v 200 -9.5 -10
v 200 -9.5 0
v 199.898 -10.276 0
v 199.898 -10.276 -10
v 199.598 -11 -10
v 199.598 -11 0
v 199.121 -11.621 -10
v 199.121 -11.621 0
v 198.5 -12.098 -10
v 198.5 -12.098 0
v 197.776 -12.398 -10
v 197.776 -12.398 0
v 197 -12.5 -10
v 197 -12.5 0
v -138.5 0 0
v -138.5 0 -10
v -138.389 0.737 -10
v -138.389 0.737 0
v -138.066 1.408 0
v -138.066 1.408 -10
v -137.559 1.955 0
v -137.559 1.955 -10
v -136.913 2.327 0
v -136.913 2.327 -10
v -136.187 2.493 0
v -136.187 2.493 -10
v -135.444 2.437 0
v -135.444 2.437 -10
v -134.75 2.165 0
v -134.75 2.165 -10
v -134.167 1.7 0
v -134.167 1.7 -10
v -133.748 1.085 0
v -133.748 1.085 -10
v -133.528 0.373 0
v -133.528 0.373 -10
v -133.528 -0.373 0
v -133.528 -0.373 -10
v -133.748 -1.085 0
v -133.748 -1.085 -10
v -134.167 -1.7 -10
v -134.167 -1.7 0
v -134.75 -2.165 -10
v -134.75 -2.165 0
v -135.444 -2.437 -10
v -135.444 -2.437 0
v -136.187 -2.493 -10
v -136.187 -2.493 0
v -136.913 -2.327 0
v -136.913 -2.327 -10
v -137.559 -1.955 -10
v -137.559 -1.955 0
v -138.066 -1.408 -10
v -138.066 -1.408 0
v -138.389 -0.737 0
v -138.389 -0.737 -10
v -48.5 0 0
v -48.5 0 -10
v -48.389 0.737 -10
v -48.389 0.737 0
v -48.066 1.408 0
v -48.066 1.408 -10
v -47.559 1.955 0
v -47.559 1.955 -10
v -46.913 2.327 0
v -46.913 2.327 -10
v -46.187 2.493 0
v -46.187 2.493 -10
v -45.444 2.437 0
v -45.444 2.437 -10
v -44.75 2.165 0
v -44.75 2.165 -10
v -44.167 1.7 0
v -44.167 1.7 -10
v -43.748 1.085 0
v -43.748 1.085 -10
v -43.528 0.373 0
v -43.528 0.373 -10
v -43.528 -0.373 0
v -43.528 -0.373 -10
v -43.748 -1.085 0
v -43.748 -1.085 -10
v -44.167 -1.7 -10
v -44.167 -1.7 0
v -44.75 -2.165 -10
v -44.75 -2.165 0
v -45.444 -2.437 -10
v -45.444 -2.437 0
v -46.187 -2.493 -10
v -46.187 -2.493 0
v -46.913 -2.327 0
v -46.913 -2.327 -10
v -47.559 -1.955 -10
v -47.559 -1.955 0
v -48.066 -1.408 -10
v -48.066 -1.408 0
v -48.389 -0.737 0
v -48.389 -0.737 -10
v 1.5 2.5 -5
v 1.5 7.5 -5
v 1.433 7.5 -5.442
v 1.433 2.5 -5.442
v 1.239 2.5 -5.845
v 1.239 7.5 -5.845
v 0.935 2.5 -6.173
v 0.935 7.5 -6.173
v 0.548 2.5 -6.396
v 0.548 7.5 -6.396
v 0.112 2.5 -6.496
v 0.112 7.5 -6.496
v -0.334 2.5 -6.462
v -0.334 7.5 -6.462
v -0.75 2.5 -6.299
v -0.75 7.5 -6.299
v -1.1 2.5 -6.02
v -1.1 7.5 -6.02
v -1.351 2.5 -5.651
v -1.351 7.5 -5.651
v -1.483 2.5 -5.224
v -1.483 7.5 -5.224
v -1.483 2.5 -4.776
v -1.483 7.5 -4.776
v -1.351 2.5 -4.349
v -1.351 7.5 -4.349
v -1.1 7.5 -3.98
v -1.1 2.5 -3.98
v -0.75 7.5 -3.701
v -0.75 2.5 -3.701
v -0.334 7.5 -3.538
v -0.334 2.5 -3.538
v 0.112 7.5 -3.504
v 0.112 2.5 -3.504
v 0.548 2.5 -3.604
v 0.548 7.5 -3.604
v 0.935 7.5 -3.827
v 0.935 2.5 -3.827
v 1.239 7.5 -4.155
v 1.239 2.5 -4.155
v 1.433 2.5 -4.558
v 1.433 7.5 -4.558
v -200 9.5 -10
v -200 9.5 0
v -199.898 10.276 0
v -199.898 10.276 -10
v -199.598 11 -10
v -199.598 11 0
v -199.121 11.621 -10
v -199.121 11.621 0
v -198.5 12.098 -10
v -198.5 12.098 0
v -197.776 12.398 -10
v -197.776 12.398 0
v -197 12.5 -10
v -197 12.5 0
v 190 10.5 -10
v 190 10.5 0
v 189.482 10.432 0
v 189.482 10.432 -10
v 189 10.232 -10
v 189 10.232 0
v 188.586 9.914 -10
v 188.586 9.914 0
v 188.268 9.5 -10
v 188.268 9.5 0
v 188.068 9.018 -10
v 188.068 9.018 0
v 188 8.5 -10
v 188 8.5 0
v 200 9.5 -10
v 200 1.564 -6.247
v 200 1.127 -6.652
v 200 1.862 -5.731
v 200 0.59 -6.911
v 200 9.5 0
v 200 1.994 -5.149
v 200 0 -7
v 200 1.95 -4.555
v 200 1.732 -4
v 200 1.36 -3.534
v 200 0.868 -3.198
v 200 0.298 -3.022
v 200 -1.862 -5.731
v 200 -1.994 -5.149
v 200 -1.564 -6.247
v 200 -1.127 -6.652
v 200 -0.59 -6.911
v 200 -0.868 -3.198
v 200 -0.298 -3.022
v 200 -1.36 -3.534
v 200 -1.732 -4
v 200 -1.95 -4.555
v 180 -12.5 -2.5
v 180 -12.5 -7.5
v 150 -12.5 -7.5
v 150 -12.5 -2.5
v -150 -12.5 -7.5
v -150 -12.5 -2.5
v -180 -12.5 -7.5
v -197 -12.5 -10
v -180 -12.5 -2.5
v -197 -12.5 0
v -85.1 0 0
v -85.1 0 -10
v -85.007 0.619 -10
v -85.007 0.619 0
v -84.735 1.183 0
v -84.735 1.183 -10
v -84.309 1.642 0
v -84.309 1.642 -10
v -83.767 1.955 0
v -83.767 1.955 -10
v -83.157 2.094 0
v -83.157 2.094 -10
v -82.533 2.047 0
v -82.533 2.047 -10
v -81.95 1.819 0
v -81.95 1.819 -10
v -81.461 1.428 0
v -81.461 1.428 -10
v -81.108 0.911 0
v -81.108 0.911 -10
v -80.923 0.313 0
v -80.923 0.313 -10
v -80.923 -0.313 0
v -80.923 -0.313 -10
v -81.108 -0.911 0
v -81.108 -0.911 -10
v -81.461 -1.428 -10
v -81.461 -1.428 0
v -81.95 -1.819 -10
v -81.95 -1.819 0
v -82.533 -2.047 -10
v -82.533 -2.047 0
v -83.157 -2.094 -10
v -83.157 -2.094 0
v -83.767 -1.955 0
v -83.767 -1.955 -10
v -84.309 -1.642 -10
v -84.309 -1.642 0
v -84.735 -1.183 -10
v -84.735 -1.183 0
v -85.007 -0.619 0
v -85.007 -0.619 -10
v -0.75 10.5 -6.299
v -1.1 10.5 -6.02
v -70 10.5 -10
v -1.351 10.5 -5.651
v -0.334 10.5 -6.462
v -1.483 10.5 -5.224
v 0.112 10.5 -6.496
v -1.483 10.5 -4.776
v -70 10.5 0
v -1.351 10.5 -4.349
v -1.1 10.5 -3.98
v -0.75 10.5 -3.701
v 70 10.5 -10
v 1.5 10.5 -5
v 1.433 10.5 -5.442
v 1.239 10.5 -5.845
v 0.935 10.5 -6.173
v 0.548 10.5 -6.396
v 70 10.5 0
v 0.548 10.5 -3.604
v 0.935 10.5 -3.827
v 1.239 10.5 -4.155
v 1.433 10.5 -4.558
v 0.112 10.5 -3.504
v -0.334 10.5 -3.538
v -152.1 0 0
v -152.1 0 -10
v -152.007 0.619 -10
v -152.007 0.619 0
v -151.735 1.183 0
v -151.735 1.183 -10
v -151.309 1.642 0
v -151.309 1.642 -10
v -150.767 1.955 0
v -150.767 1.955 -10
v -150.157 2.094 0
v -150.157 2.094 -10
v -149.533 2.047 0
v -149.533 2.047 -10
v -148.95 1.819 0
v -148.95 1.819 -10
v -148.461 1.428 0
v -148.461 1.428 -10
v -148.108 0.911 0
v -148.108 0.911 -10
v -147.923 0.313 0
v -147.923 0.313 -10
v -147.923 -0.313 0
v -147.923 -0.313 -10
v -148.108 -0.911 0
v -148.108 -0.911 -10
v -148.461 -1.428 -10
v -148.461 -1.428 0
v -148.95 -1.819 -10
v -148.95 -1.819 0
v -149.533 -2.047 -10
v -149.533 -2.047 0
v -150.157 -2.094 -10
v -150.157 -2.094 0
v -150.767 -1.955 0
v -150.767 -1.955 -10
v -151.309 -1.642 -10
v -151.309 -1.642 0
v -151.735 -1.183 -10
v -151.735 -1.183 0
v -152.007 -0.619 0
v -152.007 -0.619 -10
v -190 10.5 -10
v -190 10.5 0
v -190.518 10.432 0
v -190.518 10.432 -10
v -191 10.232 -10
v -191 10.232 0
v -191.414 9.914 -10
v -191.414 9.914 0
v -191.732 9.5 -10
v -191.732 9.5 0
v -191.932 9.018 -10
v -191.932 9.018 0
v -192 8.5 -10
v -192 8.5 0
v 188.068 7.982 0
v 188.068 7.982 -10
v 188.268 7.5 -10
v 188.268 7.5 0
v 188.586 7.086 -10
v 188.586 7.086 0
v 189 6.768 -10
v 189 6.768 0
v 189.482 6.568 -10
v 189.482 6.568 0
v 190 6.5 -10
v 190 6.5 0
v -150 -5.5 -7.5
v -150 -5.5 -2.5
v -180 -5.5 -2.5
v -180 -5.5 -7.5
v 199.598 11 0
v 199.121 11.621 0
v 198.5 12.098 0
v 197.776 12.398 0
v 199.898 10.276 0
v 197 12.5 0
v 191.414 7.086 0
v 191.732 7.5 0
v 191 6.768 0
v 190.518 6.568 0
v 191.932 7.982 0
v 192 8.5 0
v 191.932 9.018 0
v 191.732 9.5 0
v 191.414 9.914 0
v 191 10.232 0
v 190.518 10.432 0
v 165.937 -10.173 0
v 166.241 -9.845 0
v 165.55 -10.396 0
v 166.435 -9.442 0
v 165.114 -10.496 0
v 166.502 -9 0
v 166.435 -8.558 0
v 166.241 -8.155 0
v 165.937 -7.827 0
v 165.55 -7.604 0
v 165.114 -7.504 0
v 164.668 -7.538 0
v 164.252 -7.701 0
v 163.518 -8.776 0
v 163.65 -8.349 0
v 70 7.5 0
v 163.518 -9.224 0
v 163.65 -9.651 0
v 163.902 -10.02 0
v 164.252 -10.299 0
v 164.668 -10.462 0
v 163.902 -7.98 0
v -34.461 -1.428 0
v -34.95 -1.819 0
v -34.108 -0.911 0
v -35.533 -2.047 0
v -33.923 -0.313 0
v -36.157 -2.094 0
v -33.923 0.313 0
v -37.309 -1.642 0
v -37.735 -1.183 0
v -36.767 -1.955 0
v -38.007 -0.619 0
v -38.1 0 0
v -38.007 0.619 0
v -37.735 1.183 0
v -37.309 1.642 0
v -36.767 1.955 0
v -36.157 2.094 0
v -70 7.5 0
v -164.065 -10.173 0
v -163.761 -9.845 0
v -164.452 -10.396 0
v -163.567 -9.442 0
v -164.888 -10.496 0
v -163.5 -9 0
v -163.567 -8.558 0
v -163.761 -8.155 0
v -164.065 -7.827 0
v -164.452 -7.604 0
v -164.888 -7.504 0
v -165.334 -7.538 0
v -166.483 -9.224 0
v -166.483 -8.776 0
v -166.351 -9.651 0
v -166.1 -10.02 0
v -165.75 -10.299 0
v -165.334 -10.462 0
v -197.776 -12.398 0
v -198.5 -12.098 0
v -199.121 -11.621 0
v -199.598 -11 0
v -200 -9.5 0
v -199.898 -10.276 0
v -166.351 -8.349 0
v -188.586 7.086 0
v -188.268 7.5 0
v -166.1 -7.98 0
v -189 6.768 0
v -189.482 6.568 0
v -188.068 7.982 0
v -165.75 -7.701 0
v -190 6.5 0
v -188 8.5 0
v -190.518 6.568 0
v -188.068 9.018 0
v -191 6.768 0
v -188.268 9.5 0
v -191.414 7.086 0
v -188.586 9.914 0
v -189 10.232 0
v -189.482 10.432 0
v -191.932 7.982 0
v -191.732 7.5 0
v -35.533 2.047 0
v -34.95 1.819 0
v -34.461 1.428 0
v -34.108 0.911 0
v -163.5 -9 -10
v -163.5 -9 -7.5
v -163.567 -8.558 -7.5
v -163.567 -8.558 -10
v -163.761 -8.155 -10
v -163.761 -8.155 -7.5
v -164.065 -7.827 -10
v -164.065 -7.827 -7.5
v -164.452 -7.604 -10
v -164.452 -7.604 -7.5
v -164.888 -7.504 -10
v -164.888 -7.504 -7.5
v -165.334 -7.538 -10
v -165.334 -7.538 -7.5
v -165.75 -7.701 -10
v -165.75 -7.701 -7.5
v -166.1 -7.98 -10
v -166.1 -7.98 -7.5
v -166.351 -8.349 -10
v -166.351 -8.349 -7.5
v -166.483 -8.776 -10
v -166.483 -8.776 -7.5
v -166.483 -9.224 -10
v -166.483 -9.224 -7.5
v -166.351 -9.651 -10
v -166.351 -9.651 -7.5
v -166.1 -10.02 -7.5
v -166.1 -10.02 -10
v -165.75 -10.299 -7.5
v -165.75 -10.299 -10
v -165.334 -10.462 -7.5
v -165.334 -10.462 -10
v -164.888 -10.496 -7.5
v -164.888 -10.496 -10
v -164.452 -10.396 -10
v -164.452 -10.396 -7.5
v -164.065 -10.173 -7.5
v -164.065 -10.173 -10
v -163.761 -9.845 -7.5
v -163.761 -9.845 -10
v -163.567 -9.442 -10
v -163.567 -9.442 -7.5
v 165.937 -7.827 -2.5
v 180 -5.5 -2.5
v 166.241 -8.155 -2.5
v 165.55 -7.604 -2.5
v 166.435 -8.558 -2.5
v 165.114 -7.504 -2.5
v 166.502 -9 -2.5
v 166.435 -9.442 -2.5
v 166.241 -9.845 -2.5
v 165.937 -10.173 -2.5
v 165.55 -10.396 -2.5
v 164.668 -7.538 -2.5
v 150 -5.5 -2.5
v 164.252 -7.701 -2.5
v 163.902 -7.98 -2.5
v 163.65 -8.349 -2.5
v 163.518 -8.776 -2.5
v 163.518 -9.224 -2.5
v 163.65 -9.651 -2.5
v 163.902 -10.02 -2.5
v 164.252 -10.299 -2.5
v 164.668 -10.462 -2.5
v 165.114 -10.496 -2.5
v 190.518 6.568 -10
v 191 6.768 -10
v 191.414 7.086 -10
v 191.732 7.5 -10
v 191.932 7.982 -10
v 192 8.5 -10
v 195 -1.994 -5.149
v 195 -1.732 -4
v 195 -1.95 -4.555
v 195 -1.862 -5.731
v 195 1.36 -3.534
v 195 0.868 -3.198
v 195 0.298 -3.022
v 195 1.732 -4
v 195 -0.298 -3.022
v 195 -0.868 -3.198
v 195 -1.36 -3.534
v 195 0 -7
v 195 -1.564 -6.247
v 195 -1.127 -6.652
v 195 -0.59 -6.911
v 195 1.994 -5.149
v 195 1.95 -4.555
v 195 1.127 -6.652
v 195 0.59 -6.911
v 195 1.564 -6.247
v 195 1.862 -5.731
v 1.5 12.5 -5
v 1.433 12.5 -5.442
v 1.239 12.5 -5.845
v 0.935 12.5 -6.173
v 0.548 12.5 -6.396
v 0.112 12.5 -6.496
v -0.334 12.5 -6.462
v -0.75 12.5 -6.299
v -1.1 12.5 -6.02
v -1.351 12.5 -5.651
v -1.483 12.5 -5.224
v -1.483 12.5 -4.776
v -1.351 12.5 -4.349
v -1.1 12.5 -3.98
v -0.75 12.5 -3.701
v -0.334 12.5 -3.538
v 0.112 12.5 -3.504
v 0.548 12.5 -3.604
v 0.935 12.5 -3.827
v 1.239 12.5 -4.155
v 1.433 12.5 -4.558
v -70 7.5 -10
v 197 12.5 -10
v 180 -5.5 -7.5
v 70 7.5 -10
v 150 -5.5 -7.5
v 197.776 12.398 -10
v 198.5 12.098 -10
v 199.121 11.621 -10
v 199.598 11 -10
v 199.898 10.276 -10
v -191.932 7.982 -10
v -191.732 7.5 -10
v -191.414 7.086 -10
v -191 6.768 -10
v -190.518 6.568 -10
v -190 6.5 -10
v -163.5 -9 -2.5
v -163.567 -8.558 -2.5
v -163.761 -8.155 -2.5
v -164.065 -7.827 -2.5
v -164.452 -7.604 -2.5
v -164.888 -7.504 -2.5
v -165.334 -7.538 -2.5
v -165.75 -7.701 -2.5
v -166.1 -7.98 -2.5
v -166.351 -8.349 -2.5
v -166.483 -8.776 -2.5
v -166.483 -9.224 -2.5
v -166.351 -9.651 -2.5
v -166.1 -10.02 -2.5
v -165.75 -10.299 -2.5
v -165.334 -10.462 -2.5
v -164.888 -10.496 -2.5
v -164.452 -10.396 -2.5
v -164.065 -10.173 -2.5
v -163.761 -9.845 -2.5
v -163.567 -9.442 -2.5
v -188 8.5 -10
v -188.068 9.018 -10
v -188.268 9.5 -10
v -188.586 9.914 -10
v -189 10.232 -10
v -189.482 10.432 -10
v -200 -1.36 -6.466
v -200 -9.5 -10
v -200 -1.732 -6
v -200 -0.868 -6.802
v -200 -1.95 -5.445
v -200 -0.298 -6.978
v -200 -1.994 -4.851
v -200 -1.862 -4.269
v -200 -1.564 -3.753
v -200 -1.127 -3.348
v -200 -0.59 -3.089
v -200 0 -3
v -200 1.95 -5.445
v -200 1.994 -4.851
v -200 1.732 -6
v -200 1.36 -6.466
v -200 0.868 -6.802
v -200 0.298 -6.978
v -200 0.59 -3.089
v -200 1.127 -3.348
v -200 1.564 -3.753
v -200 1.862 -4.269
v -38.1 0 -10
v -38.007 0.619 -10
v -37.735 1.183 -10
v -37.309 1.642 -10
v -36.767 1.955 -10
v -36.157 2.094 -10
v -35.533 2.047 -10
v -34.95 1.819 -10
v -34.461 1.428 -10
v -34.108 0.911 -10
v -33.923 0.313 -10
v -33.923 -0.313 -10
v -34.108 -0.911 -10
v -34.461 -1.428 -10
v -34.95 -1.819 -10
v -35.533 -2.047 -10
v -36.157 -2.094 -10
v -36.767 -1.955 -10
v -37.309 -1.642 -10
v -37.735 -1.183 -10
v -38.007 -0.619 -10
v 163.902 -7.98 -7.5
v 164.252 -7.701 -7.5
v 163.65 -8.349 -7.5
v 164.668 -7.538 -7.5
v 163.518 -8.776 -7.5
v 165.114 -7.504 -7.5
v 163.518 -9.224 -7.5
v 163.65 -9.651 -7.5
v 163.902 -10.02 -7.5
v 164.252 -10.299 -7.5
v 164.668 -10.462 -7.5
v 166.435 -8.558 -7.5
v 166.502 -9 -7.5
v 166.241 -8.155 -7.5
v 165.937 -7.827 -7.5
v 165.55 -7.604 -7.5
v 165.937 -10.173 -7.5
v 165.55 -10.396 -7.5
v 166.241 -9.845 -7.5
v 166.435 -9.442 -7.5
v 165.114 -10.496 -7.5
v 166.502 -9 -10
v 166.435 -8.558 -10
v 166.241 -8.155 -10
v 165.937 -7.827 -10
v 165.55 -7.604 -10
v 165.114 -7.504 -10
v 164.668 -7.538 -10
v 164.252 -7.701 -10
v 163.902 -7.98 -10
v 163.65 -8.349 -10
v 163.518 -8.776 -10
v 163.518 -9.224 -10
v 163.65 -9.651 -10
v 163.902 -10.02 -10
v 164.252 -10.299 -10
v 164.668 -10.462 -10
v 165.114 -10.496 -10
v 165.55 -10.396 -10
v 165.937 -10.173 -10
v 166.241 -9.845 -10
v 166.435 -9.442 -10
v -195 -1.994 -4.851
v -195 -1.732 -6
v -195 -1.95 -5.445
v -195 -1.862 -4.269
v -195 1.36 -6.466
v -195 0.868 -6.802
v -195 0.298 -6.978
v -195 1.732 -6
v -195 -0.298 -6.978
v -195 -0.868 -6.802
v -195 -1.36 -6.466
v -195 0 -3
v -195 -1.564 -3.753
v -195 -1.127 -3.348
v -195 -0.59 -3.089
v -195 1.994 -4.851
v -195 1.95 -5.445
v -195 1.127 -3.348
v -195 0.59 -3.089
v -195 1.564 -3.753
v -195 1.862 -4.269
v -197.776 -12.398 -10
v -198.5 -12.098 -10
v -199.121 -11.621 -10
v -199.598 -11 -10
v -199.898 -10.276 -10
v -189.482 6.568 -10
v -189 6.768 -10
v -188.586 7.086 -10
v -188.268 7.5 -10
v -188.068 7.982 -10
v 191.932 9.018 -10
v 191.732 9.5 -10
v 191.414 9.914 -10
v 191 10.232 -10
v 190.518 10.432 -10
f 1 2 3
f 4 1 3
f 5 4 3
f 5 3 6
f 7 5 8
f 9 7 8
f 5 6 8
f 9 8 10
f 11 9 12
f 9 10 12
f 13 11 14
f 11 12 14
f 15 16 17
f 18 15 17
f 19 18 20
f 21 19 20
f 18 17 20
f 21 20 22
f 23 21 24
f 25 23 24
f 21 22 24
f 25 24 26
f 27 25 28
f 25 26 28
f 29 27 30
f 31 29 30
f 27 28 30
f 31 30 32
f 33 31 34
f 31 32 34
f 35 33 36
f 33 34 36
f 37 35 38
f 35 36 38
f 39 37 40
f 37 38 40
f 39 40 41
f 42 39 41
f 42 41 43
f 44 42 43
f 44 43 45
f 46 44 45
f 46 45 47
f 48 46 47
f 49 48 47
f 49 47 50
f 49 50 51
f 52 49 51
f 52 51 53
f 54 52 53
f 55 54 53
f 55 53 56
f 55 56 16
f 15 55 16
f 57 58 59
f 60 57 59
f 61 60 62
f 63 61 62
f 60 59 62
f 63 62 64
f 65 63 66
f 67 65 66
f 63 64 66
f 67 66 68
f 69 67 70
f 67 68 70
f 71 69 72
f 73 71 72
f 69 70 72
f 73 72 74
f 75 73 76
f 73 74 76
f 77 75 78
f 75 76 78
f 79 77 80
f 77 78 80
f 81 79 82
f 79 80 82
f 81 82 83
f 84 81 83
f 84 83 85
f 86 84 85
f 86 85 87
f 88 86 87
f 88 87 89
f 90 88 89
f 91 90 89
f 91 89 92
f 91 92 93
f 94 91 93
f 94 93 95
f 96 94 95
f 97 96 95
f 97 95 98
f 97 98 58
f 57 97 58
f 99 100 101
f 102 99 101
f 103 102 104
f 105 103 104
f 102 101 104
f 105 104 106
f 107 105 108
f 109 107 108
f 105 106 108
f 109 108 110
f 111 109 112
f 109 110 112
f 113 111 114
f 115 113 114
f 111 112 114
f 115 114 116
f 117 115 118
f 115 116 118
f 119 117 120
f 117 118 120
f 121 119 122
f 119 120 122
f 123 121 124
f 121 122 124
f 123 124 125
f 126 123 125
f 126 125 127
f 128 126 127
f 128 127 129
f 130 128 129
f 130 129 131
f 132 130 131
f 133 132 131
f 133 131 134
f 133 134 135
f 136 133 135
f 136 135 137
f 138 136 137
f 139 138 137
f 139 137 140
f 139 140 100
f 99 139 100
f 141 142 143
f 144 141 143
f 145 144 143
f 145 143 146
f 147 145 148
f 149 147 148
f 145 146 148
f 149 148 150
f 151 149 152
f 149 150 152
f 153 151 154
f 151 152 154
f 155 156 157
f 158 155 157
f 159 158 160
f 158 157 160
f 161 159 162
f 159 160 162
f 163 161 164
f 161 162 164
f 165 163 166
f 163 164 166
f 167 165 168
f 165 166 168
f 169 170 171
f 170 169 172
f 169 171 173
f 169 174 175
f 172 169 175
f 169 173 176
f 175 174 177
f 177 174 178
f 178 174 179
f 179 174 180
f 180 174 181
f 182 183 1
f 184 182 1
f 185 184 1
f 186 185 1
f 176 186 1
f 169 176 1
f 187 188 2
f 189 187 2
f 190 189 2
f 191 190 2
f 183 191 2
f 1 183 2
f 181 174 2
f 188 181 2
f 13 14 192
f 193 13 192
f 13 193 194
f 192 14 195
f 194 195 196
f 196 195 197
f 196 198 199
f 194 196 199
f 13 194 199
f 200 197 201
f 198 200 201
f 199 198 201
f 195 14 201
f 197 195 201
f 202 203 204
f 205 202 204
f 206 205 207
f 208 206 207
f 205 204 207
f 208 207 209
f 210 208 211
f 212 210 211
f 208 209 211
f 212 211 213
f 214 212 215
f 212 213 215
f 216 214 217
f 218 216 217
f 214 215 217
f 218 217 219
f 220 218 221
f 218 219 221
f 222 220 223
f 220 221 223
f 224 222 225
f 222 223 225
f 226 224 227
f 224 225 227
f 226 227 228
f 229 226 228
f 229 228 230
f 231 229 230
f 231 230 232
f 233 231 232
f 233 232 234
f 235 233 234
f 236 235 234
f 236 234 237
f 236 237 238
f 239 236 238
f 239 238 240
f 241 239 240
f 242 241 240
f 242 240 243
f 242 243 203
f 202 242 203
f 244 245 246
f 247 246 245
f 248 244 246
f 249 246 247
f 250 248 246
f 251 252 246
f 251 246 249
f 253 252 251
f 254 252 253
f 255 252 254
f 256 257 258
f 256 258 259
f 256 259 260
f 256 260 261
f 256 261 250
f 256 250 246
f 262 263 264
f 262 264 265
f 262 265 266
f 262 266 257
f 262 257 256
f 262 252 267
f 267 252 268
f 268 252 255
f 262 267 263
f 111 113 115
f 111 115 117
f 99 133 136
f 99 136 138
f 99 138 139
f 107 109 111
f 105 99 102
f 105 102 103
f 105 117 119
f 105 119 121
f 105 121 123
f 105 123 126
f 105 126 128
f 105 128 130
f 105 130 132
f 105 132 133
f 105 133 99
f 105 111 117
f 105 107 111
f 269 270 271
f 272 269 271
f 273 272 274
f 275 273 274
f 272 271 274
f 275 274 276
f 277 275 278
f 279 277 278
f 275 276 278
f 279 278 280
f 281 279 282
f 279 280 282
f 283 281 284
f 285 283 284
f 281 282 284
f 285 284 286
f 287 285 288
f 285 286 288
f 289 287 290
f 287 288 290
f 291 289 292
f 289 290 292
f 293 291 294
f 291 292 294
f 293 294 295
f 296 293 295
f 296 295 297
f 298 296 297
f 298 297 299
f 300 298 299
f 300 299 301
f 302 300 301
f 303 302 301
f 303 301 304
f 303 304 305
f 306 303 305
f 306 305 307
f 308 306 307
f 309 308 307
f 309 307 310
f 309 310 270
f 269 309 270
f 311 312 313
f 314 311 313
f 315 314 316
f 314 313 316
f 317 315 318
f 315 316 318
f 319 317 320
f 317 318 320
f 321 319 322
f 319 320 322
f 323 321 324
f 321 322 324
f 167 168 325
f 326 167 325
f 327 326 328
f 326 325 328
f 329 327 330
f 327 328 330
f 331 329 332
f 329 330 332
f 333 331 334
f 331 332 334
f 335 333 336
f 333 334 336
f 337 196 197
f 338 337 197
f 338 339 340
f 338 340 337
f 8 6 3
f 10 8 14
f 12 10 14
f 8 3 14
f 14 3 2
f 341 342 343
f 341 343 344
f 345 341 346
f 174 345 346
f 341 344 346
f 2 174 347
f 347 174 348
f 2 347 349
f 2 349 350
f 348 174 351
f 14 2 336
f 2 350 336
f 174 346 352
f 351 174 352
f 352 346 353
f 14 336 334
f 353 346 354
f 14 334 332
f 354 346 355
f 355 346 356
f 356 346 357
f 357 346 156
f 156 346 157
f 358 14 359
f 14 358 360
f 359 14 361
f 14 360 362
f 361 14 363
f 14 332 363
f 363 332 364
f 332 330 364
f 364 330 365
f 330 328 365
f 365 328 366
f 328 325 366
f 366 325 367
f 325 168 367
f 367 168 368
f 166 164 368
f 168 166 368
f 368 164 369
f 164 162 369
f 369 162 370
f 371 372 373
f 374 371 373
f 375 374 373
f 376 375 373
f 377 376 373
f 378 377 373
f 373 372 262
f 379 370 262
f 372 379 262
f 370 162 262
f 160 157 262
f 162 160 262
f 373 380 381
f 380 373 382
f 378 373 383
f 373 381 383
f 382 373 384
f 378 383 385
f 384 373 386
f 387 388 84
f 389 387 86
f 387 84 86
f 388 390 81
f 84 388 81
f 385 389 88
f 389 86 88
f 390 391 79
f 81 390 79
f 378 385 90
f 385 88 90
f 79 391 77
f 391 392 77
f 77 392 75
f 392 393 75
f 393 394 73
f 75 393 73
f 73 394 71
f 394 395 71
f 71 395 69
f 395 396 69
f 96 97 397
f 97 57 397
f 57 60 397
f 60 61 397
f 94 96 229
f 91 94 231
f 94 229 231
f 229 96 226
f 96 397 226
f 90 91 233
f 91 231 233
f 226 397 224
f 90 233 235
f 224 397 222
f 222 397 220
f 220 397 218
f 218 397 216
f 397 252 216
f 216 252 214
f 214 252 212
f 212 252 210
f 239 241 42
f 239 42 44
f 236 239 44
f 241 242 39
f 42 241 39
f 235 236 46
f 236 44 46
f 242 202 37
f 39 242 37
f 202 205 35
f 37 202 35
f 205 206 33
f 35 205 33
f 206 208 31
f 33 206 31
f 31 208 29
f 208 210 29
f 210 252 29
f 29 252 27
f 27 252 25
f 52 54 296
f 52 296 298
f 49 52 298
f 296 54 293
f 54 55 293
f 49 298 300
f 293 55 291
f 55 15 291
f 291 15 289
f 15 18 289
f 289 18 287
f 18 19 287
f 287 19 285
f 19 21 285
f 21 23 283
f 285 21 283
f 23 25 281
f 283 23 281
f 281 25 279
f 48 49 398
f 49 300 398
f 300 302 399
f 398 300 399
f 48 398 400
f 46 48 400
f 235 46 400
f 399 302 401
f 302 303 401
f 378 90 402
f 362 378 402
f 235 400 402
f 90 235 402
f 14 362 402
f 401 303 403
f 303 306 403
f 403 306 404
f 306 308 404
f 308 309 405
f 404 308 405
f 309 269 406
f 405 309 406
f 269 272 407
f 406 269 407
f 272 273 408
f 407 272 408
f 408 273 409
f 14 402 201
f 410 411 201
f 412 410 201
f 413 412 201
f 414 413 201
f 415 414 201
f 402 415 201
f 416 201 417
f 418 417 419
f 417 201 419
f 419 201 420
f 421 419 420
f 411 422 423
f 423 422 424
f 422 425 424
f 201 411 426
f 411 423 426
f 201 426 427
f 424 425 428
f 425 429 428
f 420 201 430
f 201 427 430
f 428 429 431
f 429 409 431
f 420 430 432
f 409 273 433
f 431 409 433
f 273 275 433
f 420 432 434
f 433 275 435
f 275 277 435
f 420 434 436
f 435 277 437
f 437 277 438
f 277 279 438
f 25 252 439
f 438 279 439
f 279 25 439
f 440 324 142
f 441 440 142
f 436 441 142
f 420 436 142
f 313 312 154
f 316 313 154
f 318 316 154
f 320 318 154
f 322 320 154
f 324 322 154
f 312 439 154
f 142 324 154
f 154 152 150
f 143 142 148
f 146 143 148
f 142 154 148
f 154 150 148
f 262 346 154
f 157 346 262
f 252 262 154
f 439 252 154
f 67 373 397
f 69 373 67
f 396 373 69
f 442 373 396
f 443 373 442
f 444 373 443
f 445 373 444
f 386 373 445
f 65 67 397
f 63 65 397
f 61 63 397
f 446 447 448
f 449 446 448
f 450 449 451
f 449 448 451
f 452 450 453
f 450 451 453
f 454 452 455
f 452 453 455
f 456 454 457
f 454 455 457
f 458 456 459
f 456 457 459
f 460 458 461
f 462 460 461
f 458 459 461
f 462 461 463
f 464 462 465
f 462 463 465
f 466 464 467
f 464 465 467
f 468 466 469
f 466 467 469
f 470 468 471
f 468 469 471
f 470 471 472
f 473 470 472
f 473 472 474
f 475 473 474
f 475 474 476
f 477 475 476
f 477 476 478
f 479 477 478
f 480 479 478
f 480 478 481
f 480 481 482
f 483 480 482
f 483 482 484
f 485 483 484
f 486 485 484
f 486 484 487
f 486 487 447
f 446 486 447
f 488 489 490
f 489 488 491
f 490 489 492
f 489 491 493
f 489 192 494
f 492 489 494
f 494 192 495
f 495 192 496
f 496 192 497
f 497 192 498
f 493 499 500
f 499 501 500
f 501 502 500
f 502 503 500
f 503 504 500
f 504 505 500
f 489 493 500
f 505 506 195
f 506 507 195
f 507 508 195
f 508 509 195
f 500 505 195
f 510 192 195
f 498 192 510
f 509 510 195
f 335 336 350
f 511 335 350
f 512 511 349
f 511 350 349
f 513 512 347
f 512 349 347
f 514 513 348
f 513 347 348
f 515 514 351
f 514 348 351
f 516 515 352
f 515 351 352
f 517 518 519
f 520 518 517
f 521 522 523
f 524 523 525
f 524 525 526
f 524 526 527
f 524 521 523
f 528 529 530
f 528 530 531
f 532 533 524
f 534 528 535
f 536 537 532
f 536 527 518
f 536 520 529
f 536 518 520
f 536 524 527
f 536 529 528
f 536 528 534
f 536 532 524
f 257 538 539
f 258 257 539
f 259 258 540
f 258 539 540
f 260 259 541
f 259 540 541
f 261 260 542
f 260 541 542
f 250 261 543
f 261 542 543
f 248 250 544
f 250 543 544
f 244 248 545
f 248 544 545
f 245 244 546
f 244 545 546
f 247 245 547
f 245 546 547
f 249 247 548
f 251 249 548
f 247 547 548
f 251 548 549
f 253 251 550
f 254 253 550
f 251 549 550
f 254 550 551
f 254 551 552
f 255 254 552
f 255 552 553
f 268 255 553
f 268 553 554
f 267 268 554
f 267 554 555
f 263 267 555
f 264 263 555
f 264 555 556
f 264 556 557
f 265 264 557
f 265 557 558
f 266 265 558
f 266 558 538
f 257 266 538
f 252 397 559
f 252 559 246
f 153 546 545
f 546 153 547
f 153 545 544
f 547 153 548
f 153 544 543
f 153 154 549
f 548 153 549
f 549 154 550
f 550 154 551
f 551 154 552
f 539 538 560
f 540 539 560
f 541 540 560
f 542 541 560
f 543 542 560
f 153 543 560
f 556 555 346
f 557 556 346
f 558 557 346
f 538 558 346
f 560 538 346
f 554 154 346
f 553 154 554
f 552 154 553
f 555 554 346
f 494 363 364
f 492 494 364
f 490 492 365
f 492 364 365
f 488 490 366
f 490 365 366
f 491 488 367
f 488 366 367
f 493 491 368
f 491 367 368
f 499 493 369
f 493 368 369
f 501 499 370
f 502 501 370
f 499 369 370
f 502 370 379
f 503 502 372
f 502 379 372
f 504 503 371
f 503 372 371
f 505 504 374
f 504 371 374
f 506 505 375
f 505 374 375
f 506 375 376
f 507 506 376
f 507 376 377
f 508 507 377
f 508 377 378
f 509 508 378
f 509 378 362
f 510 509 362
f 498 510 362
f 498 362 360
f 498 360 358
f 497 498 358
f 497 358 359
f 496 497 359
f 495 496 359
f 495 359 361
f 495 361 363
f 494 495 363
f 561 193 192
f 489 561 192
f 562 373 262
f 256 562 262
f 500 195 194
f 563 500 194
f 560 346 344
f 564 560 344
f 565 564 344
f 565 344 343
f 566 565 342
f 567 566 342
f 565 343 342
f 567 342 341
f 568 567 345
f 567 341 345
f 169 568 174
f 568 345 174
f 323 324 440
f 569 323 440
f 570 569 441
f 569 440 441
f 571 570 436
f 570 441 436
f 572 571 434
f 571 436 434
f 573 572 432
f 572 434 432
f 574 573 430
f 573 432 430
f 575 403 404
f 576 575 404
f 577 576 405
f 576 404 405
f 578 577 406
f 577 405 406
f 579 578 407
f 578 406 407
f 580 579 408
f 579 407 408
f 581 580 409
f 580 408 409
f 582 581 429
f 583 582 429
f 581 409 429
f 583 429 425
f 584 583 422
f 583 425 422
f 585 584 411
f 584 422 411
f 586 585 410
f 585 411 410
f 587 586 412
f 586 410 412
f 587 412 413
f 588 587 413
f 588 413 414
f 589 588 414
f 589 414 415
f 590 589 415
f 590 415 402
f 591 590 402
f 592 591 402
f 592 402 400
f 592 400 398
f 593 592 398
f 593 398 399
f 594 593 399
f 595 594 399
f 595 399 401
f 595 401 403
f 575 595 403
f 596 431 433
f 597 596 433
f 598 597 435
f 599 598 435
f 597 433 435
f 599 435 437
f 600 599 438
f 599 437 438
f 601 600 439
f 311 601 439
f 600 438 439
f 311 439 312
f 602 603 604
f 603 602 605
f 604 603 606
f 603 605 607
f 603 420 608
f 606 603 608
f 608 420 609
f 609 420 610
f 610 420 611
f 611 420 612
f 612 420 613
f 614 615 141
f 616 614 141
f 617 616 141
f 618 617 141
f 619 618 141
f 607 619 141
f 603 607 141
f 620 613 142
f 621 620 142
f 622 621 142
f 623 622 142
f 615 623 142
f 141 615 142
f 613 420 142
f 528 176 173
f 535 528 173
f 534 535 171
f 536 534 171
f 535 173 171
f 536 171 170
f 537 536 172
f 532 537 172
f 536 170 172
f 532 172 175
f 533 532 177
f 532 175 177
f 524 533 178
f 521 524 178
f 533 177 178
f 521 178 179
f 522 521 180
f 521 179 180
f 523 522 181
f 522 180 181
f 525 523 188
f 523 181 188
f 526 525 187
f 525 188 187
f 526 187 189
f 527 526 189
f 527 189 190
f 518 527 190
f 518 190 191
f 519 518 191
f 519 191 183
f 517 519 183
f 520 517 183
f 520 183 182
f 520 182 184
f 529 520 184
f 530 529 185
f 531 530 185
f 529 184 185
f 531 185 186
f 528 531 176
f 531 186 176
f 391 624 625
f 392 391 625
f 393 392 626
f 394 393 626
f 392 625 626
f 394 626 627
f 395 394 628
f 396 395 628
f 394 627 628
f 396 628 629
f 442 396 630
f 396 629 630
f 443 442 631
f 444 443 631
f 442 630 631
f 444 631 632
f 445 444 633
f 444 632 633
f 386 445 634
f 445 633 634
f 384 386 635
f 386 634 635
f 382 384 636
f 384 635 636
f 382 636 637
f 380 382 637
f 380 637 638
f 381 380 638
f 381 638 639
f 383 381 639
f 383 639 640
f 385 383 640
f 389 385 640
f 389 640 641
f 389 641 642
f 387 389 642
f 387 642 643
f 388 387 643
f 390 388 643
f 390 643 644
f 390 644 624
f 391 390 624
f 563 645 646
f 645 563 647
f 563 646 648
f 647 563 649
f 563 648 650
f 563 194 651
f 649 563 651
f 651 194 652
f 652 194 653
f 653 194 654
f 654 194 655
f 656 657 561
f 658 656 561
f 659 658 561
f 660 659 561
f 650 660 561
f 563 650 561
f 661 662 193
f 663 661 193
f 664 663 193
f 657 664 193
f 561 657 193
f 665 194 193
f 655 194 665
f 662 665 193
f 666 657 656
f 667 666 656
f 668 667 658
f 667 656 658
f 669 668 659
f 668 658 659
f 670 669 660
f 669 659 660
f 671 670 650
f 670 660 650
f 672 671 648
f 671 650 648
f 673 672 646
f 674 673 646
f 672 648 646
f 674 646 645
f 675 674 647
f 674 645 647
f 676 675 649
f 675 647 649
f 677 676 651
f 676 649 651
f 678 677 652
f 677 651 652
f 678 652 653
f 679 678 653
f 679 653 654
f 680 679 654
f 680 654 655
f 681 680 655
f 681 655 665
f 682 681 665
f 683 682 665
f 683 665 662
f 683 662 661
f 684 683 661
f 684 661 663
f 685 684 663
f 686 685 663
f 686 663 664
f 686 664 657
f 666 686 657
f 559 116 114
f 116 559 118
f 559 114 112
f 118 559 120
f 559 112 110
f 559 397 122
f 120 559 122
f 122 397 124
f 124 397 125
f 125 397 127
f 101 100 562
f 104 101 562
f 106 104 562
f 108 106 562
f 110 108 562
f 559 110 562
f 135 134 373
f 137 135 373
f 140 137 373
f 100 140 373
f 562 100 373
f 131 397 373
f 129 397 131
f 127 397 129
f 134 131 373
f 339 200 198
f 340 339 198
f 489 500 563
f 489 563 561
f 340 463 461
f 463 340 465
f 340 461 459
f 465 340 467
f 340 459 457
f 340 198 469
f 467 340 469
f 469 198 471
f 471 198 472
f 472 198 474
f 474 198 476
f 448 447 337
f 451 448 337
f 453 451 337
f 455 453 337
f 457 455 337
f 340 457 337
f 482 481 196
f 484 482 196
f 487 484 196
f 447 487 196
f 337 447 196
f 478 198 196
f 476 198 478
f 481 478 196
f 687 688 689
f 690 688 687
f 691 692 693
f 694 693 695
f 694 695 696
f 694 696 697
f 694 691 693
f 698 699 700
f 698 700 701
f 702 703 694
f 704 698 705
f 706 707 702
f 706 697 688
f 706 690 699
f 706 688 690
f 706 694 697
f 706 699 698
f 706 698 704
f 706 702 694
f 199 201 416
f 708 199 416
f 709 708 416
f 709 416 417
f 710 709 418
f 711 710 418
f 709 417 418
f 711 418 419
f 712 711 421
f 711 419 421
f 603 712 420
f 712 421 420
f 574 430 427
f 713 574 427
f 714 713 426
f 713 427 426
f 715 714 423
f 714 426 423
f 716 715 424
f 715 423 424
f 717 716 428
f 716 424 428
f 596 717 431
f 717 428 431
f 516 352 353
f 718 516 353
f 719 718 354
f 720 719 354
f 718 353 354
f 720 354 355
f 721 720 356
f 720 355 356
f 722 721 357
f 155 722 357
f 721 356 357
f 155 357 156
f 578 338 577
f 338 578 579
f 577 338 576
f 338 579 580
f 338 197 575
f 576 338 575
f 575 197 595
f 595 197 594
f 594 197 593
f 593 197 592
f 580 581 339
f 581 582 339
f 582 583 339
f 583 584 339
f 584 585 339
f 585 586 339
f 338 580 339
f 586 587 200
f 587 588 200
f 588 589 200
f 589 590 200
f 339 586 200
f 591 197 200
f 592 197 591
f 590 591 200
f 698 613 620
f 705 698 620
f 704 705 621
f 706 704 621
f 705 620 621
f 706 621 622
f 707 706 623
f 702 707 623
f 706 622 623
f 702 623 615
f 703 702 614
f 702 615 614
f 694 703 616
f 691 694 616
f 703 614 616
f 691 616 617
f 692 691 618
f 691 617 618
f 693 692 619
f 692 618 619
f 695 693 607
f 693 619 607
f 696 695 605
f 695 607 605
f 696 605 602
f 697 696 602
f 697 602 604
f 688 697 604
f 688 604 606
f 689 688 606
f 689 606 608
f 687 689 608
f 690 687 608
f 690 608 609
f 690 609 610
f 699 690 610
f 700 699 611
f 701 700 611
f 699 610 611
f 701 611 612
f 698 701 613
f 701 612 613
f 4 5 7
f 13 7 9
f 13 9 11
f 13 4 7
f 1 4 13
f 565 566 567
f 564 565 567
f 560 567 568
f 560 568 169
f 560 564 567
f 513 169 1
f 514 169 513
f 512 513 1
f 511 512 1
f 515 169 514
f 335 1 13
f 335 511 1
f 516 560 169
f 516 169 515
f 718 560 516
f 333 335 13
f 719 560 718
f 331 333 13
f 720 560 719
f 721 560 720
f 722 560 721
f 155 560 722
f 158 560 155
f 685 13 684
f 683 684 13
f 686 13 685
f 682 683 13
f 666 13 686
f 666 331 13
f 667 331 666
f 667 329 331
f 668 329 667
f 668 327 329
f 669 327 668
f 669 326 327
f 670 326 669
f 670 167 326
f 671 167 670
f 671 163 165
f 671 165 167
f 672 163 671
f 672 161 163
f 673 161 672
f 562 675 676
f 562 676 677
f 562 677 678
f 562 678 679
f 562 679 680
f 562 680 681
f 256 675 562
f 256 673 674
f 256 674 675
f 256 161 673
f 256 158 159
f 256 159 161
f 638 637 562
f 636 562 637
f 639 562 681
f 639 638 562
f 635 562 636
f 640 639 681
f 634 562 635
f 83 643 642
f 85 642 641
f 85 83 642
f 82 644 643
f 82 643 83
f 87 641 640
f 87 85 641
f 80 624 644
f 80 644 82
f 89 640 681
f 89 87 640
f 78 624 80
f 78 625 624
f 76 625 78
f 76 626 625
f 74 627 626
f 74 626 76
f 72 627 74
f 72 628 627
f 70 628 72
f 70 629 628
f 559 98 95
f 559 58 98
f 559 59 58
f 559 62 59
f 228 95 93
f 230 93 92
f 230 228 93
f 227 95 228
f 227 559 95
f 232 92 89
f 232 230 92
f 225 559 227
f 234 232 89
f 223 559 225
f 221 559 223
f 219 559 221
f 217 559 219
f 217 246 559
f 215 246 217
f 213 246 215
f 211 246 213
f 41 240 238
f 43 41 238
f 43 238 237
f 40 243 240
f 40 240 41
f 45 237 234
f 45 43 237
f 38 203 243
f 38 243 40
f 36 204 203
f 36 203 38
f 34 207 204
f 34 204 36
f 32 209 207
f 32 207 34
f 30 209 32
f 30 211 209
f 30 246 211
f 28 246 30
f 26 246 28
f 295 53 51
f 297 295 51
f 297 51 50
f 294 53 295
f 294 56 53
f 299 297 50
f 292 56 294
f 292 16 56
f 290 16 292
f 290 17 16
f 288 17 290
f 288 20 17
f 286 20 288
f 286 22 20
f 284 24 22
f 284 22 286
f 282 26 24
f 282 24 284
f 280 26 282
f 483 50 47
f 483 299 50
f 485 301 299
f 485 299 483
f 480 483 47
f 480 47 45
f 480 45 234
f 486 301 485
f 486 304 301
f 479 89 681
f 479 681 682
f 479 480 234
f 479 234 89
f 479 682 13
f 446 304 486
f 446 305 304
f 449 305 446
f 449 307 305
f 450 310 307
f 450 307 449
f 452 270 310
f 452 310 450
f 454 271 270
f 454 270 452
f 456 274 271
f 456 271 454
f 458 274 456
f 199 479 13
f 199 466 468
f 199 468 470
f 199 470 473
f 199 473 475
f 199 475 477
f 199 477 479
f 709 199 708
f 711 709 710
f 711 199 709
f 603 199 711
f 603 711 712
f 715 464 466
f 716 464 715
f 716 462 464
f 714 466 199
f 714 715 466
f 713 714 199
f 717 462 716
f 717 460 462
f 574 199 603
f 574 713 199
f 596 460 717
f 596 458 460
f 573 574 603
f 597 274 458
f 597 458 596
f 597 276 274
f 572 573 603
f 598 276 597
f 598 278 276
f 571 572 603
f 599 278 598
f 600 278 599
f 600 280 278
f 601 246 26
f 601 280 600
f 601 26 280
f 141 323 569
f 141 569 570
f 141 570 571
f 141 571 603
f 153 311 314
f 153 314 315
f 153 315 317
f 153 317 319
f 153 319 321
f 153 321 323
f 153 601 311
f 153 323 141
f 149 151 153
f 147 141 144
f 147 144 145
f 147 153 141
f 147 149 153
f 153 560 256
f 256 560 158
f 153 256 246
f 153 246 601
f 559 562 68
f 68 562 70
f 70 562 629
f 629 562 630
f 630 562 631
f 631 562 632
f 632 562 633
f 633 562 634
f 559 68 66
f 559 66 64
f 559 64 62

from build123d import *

# Parameters (mm, degrees)
EXTRUDE_1_DEPTH        = 10
SKETCH_3_W             = 140
SKETCH_3_H             = 3
CUT_EXTRUDE_1_DEPTH    = 10
CUT_EXTRUDE_2_DEPTH    = 10
HOLE_WIZARD_M5_3_D     = 4.2
HOLE_WIZARD_M5_3_DEPTH = 14
HOLE_WIZARD_M5_3_TIP   = 1.2618073
HOLE_WIZARD_M6_2_D     = 5
HOLE_WIZARD_M6_2_DEPTH = 17
HOLE_WIZARD_M6_2_TIP   = 1.502151548
SKETCH_10_W            = 15
SKETCH_10_H            = 2.5
CUT_EXTRUDE_3_DEPTH    = 7
SKETCH_11_R            = 1.5
CUT_EXTRUDE_4_DEPTH    = 11
SKETCH_13_R            = 2
CUT_EXTRUDE_6_DEPTH    = 5
SKETCH_14_R            = 2
CUT_EXTRUDE_7_DEPTH    = 5
SKETCH_16_R            = 1.5
CUT_EXTRUDE_8_DEPTH    = 10


with BuildPart() as part:
    # 草图1 → 凸台-拉伸1 (new body)
    with BuildSketch(Plane.XY):
        with BuildLine():
            Line((-197, 12.5), (197, 12.5))
            ThreePointArc((197, 12.5), (199.121320344, 11.621320344), (200, 9.5))
            Line((200, 9.5), (200, -9.5))
            ThreePointArc((200, -9.5), (199.121320344, -11.621320344), (197, -12.5))
            Line((197, -12.5), (-197, -12.5))
            ThreePointArc((-197, -12.5), (-199.121320344, -11.621320344), (-200, -9.5))
            Line((-200, -9.5), (-200, 9.5))
            ThreePointArc((-200, 9.5), (-199.121320344, 11.621320344), (-197, 12.5))
        make_face()
    extrude(amount=-EXTRUDE_1_DEPTH)

    # 草图3 → 切除-拉伸1 (cut)
    with BuildSketch(Plane.XY):
        with Locations((0, 9)):
            Rectangle(SKETCH_3_W, SKETCH_3_H)
    extrude(amount=-CUT_EXTRUDE_1_DEPTH, mode=Mode.SUBTRACT)

    # 草图4 → 切除-拉伸2 (cut)
    with BuildSketch(Plane.XY):
        with BuildLine():
            ThreePointArc((-190, 10.5), (-191.414213562, 9.914213562), (-192, 8.5))
            Line((-192, 8.5), (-190, 8.5))
            Line((-190, 8.5), (-190, 10.5))
        make_face()
        with BuildLine():
            Line((-190, 8.5), (-192, 8.5))
            ThreePointArc((-192, 8.5), (-191.414213562, 7.085786438), (-190, 6.5))
            Line((-190, 6.5), (-190, 8.5))
        make_face()
        with BuildLine():
            Line((-190, 10.5), (-190, 8.5))
            Line((-190, 8.5), (-188, 8.5))
            ThreePointArc((-188, 8.5), (-188.585786438, 9.914213562), (-190, 10.5))
        make_face()
        with BuildLine():
            Line((-188, 8.5), (-190, 8.5))
            Line((-190, 8.5), (-190, 6.5))
            ThreePointArc((-190, 6.5), (-188.585786438, 7.085786438), (-188, 8.5))
        make_face()
        with BuildLine():
            ThreePointArc((190, 10.5), (188.585786438, 9.914213562), (188, 8.5))
            Line((188, 8.5), (190, 8.5))
            Line((190, 8.5), (190, 10.5))
        make_face()
        with BuildLine():
            Line((190, 8.5), (188, 8.5))
            ThreePointArc((188, 8.5), (188.585786438, 7.085786438), (190, 6.5))
            Line((190, 6.5), (190, 8.5))
        make_face()
        with BuildLine():
            Line((190, 10.5), (190, 8.5))
            Line((190, 8.5), (192, 8.5))
            ThreePointArc((192, 8.5), (191.414213562, 9.914213562), (190, 10.5))
        make_face()
        with BuildLine():
            Line((192, 8.5), (190, 8.5))
            Line((190, 8.5), (190, 6.5))
            ThreePointArc((190, 6.5), (191.414213562, 7.085786438), (192, 8.5))
        make_face()
    extrude(amount=-CUT_EXTRUDE_2_DEPTH, mode=Mode.SUBTRACT)

    # M5 螺纹孔3
    with Locations(Plane.XY):
        with Locations((-150, 0), (-83, 0), (-36, 0)):
            Hole(HOLE_WIZARD_M5_3_D / 2, depth=HOLE_WIZARD_M5_3_DEPTH)
            with Locations((0, 0, -(HOLE_WIZARD_M5_3_DEPTH + HOLE_WIZARD_M5_3_TIP / 2))):  # 118° drill point
                Cone(0, HOLE_WIZARD_M5_3_D / 2, HOLE_WIZARD_M5_3_TIP, mode=Mode.SUBTRACT)

    # M6 螺纹孔2
    with Locations(Plane.XY):
        with Locations((-46, 0), (-136, 0)):
            Hole(HOLE_WIZARD_M6_2_D / 2, depth=HOLE_WIZARD_M6_2_DEPTH)
            with Locations((0, 0, -(HOLE_WIZARD_M6_2_DEPTH + HOLE_WIZARD_M6_2_TIP / 2))):  # 118° drill point
                Cone(0, HOLE_WIZARD_M6_2_D / 2, HOLE_WIZARD_M6_2_TIP, mode=Mode.SUBTRACT)

    # 草图10 → 切除-拉伸3 (cut)
    with BuildSketch(Plane.XZ.offset(12.5)):
        with Locations((-172.5, -3.75)):
            Rectangle(SKETCH_10_W, SKETCH_10_H)
        with Locations((-157.5, -3.75)):
            Rectangle(SKETCH_10_W, SKETCH_10_H)
        with Locations((-157.5, -6.25)):
            Rectangle(SKETCH_10_W, SKETCH_10_H)
        with Locations((-172.5, -6.25)):
            Rectangle(SKETCH_10_W, SKETCH_10_H)
        with Locations((157.5, -3.75)):
            Rectangle(SKETCH_10_W, SKETCH_10_H)
        with Locations((172.5, -3.75)):
            Rectangle(SKETCH_10_W, SKETCH_10_H)
        with Locations((157.5, -6.25)):
            Rectangle(SKETCH_10_W, SKETCH_10_H)
        with Locations((172.5, -6.25)):
            Rectangle(SKETCH_10_W, SKETCH_10_H)
    extrude(amount=-CUT_EXTRUDE_3_DEPTH, mode=Mode.SUBTRACT)

    # 草图11 → 切除-拉伸4 (cut, through all)
    with BuildSketch(Plane.XY):
        with Locations((-165, -9)):
            Circle(SKETCH_11_R)
        with Locations((165.001644556, -9)):
            Circle(SKETCH_11_R)
    extrude(amount=-CUT_EXTRUDE_4_DEPTH, mode=Mode.SUBTRACT)

    # 草图13 → 切除-拉伸6 (cut)
    with BuildSketch(Plane(origin=(200, 0, 0), x_dir=(0, 0, -1), z_dir=(1, 0, 0))):
        with Locations((5, 0)):
            Circle(SKETCH_13_R)
    extrude(amount=-CUT_EXTRUDE_6_DEPTH, mode=Mode.SUBTRACT)

    # 草图14 → 切除-拉伸7 (cut)
    with BuildSketch(Plane.ZY.offset(200)):
        with Locations((-5, 0)):
            Circle(SKETCH_14_R)
    extrude(amount=-CUT_EXTRUDE_7_DEPTH, mode=Mode.SUBTRACT)

    # 草图16 → 切除-拉伸8 (cut)
    with BuildSketch(Plane(origin=(0, 12.5, 0), x_dir=(1, 0, 0), z_dir=(0, 1, 0))):
        with Locations((0, 5)):
            Circle(SKETCH_16_R)
    extrude(amount=-CUT_EXTRUDE_8_DEPTH, mode=Mode.SUBTRACT)


solid = part.part
